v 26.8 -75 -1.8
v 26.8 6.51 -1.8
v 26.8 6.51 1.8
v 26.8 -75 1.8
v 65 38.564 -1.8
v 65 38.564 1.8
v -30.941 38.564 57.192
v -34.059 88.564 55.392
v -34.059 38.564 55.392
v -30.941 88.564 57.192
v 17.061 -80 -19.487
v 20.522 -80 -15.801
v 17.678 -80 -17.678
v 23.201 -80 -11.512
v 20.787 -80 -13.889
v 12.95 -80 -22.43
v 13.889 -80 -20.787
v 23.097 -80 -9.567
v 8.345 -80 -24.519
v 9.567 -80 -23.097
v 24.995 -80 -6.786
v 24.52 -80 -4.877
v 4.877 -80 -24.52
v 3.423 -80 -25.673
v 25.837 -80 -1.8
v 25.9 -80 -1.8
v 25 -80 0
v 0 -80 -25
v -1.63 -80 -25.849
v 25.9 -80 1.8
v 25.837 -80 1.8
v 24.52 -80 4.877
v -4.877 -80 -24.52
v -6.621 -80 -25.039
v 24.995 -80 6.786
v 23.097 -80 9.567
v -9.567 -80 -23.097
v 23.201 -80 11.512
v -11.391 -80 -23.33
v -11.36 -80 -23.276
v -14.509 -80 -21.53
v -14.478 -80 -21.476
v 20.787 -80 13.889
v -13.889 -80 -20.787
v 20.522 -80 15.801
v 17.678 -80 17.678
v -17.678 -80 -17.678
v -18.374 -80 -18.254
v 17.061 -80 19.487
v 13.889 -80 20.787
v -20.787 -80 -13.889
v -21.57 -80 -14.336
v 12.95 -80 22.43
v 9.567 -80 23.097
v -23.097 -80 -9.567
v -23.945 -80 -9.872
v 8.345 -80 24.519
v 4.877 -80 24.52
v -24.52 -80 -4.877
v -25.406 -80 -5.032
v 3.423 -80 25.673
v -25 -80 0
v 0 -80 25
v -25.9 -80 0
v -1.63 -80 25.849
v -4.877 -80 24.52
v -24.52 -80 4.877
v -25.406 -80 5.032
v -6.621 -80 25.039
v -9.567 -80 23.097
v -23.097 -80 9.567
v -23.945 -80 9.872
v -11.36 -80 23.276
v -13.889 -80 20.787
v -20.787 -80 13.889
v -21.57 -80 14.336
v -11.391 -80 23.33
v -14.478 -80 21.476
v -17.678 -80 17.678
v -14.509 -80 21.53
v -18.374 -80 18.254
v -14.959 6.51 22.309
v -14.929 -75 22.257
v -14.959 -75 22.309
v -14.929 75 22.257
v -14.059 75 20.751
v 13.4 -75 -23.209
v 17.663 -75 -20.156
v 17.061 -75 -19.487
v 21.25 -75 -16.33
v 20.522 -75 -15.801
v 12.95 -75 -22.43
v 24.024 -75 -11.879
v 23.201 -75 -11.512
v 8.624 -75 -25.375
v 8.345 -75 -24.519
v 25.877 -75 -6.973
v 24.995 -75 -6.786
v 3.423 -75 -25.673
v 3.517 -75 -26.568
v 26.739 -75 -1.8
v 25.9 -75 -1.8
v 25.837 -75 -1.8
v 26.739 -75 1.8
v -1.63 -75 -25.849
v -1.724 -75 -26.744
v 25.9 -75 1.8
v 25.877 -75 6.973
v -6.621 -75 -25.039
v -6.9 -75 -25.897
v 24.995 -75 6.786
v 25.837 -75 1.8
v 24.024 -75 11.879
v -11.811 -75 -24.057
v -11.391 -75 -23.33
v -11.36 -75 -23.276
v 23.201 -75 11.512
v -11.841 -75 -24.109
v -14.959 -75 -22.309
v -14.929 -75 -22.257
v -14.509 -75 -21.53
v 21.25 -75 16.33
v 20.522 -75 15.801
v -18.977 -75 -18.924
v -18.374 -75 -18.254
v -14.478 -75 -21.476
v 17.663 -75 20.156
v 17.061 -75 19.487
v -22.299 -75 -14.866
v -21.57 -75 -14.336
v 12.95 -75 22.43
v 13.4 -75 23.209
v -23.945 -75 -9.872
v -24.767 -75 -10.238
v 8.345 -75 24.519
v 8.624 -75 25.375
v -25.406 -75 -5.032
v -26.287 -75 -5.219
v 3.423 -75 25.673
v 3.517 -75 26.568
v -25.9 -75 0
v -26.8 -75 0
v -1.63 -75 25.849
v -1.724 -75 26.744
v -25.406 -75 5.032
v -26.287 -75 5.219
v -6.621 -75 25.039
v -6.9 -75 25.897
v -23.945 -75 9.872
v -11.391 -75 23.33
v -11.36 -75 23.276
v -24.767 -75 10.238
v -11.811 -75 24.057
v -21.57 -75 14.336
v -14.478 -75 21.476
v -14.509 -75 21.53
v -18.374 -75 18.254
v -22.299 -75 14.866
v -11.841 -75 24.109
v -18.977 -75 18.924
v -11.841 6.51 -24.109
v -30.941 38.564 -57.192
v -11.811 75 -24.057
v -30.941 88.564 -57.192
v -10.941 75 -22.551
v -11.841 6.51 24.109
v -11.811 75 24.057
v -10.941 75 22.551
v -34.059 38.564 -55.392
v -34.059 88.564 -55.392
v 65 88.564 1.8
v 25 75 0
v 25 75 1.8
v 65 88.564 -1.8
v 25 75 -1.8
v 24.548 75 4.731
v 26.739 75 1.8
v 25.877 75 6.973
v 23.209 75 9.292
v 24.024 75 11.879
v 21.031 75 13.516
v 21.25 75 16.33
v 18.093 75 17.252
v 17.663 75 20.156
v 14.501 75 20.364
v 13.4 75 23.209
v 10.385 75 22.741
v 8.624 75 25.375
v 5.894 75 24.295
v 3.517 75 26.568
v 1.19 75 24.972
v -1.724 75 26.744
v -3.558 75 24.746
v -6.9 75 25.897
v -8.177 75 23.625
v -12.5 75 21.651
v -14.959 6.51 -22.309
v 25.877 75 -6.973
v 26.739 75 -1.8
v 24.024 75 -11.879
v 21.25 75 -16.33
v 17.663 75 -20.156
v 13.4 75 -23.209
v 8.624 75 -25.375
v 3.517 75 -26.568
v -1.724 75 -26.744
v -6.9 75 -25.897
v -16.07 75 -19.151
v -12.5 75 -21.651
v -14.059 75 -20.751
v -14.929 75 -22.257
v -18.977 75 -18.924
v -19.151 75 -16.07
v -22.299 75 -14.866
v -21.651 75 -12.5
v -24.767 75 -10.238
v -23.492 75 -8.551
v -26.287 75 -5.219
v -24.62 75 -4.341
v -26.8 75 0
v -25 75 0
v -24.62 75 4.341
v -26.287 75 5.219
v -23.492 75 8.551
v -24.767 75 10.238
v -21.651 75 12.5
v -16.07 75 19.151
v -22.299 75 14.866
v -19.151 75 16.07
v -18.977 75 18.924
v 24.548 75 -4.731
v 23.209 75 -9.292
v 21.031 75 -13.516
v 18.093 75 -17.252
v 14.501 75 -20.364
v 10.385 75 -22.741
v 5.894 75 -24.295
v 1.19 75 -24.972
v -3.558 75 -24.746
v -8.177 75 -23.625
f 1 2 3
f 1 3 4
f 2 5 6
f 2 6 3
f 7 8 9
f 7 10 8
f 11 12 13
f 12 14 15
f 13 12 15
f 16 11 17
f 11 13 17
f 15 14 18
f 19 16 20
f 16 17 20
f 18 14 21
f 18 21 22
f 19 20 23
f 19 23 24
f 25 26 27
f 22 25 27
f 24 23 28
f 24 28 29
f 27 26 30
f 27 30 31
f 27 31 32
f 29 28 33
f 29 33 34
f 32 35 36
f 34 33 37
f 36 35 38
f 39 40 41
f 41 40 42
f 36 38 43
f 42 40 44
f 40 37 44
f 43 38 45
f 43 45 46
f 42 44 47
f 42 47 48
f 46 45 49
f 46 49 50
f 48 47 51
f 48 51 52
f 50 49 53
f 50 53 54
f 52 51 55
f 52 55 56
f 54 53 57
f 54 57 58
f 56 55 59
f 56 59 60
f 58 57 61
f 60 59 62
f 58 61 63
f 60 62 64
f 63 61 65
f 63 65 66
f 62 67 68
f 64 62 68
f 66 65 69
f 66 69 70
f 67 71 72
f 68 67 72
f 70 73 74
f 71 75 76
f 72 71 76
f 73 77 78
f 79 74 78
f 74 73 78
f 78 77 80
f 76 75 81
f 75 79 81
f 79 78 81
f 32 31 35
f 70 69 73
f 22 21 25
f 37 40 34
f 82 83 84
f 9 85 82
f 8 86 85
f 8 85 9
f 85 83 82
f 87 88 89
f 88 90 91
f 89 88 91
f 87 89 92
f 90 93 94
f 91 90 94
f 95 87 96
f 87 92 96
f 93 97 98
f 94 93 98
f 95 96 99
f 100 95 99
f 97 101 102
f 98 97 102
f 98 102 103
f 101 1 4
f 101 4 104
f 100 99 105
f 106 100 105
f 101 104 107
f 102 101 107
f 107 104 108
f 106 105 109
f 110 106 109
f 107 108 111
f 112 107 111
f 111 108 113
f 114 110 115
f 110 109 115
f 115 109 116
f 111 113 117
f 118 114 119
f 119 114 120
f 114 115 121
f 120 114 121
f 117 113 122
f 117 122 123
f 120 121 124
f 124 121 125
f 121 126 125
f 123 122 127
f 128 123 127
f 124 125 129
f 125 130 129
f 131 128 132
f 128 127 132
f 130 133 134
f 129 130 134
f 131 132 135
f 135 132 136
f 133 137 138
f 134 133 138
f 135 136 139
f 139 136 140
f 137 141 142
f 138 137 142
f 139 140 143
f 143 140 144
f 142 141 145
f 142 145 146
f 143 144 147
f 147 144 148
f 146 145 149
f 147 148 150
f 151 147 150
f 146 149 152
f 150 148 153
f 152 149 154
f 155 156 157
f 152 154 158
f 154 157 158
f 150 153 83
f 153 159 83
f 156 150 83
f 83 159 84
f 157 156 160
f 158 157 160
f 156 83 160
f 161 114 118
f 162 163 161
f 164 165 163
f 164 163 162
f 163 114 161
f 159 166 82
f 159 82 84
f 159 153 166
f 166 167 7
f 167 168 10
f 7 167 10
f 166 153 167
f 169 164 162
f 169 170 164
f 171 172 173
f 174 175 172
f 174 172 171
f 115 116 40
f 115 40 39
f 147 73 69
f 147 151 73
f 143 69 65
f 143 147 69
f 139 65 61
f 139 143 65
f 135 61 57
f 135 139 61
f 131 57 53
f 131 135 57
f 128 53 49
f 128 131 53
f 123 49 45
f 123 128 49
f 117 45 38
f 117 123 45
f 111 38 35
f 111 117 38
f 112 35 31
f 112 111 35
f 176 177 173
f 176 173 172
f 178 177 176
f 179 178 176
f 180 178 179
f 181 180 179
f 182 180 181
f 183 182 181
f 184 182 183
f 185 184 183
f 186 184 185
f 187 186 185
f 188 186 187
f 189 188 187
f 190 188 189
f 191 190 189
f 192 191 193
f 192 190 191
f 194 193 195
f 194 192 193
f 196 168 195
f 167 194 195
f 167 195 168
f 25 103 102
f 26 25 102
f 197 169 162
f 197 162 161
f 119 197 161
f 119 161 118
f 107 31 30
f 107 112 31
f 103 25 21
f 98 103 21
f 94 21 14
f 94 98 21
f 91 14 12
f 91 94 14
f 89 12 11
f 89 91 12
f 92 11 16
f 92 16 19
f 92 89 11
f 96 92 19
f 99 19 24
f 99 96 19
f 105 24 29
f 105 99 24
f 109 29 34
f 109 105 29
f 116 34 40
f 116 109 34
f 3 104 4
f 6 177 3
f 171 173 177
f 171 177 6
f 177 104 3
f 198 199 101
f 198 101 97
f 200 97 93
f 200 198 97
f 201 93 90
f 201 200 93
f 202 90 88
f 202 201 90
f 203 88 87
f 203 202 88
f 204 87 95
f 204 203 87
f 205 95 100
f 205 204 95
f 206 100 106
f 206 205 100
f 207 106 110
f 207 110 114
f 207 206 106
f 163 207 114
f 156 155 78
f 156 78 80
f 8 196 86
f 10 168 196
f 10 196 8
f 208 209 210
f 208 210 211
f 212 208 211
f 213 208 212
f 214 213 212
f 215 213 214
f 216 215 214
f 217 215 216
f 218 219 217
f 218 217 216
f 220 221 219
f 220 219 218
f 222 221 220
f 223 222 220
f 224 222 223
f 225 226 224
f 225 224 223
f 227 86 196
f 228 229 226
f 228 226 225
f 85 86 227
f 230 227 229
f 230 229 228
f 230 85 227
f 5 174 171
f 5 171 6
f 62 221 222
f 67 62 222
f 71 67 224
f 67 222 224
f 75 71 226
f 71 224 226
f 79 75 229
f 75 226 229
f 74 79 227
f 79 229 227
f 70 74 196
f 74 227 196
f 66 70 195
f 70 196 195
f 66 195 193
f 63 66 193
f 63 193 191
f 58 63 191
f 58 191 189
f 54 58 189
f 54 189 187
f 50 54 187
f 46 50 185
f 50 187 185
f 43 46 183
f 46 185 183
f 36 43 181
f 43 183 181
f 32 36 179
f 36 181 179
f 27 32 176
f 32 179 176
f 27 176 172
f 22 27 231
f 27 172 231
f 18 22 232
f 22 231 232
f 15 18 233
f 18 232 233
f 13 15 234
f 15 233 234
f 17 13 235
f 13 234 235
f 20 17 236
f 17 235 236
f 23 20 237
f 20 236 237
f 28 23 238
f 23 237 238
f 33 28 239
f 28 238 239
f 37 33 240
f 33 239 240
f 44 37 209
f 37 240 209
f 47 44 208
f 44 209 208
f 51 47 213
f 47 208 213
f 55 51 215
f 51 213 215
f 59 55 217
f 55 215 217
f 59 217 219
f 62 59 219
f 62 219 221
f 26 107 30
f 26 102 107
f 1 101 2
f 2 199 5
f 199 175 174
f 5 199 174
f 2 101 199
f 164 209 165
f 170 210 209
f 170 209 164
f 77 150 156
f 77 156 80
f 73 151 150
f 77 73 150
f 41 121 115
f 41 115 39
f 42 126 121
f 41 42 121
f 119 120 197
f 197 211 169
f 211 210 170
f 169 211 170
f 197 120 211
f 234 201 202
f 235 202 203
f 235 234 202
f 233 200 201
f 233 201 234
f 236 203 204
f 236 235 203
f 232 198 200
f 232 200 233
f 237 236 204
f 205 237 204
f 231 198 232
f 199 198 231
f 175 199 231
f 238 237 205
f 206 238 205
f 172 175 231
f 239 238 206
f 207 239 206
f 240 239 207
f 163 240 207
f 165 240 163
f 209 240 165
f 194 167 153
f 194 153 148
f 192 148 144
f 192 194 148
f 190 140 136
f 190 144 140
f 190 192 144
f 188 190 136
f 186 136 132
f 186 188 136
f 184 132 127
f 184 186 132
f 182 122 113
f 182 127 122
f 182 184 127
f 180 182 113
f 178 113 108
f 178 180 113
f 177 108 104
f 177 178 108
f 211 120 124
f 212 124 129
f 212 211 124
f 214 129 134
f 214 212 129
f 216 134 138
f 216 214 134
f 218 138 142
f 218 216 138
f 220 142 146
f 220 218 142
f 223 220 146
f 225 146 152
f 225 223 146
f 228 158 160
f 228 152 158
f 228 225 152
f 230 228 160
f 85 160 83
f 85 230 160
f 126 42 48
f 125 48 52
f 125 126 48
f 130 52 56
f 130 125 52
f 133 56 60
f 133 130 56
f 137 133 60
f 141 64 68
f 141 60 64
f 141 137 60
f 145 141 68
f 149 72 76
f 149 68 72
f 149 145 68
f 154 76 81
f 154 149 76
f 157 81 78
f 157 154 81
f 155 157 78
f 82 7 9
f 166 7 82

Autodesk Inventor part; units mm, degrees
ref_plane "YZ Plane" through (0, 0, 0) normal (1, 0, 0) x (0, 1, 0)
ref_plane "XZ Plane" through (0, 0, 0) normal (0, 1, 0) x (-1, 0, 0)
ref_plane "XY Plane" through (0, 0, 0) normal (0, 0, 1) x (1, 0, 0)
sketch "Sketch1" plane through (0, 0, 0) normal (0, 1, 0) x (-1, 0, 0)
  circle A0 centre (0, 0) radius 25
  circle A1 centre (0, 0) radius 25.9
  circle A2 centre (0, 0) radius 26.8
  dimension "d0" = 50
  dimension "d1" = 51.8
  dimension "d2" = 53.6
extrude "Extrusion1" add sketch "Sketch1" along normal blind 75 and the other way blind 80 contours A1
extrude "Extrusion2" add sketch "Sketch1" along normal blind 75 and the other way blind 75 contours A2
sketch "Sketch4" plane through (0, 0, 0) normal (0, 0, 1) x (1, 0, 0)
  line L0 (65, 99.9302) -> (65, 38.564)
  line L1 (65, 38.564) -> (25, 5)
  line L2 (25, 5) -> (25, 75)
  line L3 (25, 75) -> (65, 88.564)
  line L4 (65, 88.564) -> (65, 99.9302)
  line L5 (-25, 75) -> (25, 75) projected
  line L6 (-25, 75) -> (25, 75) projected
  line L7 (25.9, -80) -> (25, -80) projected
  line L8 (25, -80) -> (25, 75) projected
  line L9 (26.8, 75) -> (26.8, -75) projected
  line L10 (-25, -80) -> (-25.9, -80) projected
  line L11 (-26.8, -75) -> (-26.8, 75) projected
  line L12 (-25, 75) -> (-25, -80) projected
  line L13 (25, 75) -> (26.8, 75) projected
  line L14 (-26.8, 75) -> (-25, 75) projected
  line L15 (26.8, -75) -> (25.9, -75) projected
  line L16 (25.9, -75) -> (25.9, -80) projected
  line L17 (-25.9, -80) -> (-25.9, -75) projected
  line L18 (-25.9, -75) -> (-26.8, -75) projected
  point P0 (0, 0)
  point P1 (26.8, 96)
  point P2 (-26.8, 96)
  point P3 (26.8, 6.5104)
  point P4 (15.9, -100)
  point P5 (-15.9, -100)
  point P6 (25, 5)
  dimension "d18" = 70
  dimension "d21" = 50
  dimension "d24" = 50
  dimension "d25" = 40
extrude "Extrusion4" add sketch "Sketch4" along normal mid plane 3.6 contours L0 L1 L9 L13 L3 | L13 L9 L1 L2 | L9 L15 L16 L7 L8 L1
pattern_circular "Circular Pattern2" count 3 over 360 about axis through (0, -10, 0) along (0, 1, 0) of "Extrusion4"
properties part number "tail" material "ABS Plastic"
